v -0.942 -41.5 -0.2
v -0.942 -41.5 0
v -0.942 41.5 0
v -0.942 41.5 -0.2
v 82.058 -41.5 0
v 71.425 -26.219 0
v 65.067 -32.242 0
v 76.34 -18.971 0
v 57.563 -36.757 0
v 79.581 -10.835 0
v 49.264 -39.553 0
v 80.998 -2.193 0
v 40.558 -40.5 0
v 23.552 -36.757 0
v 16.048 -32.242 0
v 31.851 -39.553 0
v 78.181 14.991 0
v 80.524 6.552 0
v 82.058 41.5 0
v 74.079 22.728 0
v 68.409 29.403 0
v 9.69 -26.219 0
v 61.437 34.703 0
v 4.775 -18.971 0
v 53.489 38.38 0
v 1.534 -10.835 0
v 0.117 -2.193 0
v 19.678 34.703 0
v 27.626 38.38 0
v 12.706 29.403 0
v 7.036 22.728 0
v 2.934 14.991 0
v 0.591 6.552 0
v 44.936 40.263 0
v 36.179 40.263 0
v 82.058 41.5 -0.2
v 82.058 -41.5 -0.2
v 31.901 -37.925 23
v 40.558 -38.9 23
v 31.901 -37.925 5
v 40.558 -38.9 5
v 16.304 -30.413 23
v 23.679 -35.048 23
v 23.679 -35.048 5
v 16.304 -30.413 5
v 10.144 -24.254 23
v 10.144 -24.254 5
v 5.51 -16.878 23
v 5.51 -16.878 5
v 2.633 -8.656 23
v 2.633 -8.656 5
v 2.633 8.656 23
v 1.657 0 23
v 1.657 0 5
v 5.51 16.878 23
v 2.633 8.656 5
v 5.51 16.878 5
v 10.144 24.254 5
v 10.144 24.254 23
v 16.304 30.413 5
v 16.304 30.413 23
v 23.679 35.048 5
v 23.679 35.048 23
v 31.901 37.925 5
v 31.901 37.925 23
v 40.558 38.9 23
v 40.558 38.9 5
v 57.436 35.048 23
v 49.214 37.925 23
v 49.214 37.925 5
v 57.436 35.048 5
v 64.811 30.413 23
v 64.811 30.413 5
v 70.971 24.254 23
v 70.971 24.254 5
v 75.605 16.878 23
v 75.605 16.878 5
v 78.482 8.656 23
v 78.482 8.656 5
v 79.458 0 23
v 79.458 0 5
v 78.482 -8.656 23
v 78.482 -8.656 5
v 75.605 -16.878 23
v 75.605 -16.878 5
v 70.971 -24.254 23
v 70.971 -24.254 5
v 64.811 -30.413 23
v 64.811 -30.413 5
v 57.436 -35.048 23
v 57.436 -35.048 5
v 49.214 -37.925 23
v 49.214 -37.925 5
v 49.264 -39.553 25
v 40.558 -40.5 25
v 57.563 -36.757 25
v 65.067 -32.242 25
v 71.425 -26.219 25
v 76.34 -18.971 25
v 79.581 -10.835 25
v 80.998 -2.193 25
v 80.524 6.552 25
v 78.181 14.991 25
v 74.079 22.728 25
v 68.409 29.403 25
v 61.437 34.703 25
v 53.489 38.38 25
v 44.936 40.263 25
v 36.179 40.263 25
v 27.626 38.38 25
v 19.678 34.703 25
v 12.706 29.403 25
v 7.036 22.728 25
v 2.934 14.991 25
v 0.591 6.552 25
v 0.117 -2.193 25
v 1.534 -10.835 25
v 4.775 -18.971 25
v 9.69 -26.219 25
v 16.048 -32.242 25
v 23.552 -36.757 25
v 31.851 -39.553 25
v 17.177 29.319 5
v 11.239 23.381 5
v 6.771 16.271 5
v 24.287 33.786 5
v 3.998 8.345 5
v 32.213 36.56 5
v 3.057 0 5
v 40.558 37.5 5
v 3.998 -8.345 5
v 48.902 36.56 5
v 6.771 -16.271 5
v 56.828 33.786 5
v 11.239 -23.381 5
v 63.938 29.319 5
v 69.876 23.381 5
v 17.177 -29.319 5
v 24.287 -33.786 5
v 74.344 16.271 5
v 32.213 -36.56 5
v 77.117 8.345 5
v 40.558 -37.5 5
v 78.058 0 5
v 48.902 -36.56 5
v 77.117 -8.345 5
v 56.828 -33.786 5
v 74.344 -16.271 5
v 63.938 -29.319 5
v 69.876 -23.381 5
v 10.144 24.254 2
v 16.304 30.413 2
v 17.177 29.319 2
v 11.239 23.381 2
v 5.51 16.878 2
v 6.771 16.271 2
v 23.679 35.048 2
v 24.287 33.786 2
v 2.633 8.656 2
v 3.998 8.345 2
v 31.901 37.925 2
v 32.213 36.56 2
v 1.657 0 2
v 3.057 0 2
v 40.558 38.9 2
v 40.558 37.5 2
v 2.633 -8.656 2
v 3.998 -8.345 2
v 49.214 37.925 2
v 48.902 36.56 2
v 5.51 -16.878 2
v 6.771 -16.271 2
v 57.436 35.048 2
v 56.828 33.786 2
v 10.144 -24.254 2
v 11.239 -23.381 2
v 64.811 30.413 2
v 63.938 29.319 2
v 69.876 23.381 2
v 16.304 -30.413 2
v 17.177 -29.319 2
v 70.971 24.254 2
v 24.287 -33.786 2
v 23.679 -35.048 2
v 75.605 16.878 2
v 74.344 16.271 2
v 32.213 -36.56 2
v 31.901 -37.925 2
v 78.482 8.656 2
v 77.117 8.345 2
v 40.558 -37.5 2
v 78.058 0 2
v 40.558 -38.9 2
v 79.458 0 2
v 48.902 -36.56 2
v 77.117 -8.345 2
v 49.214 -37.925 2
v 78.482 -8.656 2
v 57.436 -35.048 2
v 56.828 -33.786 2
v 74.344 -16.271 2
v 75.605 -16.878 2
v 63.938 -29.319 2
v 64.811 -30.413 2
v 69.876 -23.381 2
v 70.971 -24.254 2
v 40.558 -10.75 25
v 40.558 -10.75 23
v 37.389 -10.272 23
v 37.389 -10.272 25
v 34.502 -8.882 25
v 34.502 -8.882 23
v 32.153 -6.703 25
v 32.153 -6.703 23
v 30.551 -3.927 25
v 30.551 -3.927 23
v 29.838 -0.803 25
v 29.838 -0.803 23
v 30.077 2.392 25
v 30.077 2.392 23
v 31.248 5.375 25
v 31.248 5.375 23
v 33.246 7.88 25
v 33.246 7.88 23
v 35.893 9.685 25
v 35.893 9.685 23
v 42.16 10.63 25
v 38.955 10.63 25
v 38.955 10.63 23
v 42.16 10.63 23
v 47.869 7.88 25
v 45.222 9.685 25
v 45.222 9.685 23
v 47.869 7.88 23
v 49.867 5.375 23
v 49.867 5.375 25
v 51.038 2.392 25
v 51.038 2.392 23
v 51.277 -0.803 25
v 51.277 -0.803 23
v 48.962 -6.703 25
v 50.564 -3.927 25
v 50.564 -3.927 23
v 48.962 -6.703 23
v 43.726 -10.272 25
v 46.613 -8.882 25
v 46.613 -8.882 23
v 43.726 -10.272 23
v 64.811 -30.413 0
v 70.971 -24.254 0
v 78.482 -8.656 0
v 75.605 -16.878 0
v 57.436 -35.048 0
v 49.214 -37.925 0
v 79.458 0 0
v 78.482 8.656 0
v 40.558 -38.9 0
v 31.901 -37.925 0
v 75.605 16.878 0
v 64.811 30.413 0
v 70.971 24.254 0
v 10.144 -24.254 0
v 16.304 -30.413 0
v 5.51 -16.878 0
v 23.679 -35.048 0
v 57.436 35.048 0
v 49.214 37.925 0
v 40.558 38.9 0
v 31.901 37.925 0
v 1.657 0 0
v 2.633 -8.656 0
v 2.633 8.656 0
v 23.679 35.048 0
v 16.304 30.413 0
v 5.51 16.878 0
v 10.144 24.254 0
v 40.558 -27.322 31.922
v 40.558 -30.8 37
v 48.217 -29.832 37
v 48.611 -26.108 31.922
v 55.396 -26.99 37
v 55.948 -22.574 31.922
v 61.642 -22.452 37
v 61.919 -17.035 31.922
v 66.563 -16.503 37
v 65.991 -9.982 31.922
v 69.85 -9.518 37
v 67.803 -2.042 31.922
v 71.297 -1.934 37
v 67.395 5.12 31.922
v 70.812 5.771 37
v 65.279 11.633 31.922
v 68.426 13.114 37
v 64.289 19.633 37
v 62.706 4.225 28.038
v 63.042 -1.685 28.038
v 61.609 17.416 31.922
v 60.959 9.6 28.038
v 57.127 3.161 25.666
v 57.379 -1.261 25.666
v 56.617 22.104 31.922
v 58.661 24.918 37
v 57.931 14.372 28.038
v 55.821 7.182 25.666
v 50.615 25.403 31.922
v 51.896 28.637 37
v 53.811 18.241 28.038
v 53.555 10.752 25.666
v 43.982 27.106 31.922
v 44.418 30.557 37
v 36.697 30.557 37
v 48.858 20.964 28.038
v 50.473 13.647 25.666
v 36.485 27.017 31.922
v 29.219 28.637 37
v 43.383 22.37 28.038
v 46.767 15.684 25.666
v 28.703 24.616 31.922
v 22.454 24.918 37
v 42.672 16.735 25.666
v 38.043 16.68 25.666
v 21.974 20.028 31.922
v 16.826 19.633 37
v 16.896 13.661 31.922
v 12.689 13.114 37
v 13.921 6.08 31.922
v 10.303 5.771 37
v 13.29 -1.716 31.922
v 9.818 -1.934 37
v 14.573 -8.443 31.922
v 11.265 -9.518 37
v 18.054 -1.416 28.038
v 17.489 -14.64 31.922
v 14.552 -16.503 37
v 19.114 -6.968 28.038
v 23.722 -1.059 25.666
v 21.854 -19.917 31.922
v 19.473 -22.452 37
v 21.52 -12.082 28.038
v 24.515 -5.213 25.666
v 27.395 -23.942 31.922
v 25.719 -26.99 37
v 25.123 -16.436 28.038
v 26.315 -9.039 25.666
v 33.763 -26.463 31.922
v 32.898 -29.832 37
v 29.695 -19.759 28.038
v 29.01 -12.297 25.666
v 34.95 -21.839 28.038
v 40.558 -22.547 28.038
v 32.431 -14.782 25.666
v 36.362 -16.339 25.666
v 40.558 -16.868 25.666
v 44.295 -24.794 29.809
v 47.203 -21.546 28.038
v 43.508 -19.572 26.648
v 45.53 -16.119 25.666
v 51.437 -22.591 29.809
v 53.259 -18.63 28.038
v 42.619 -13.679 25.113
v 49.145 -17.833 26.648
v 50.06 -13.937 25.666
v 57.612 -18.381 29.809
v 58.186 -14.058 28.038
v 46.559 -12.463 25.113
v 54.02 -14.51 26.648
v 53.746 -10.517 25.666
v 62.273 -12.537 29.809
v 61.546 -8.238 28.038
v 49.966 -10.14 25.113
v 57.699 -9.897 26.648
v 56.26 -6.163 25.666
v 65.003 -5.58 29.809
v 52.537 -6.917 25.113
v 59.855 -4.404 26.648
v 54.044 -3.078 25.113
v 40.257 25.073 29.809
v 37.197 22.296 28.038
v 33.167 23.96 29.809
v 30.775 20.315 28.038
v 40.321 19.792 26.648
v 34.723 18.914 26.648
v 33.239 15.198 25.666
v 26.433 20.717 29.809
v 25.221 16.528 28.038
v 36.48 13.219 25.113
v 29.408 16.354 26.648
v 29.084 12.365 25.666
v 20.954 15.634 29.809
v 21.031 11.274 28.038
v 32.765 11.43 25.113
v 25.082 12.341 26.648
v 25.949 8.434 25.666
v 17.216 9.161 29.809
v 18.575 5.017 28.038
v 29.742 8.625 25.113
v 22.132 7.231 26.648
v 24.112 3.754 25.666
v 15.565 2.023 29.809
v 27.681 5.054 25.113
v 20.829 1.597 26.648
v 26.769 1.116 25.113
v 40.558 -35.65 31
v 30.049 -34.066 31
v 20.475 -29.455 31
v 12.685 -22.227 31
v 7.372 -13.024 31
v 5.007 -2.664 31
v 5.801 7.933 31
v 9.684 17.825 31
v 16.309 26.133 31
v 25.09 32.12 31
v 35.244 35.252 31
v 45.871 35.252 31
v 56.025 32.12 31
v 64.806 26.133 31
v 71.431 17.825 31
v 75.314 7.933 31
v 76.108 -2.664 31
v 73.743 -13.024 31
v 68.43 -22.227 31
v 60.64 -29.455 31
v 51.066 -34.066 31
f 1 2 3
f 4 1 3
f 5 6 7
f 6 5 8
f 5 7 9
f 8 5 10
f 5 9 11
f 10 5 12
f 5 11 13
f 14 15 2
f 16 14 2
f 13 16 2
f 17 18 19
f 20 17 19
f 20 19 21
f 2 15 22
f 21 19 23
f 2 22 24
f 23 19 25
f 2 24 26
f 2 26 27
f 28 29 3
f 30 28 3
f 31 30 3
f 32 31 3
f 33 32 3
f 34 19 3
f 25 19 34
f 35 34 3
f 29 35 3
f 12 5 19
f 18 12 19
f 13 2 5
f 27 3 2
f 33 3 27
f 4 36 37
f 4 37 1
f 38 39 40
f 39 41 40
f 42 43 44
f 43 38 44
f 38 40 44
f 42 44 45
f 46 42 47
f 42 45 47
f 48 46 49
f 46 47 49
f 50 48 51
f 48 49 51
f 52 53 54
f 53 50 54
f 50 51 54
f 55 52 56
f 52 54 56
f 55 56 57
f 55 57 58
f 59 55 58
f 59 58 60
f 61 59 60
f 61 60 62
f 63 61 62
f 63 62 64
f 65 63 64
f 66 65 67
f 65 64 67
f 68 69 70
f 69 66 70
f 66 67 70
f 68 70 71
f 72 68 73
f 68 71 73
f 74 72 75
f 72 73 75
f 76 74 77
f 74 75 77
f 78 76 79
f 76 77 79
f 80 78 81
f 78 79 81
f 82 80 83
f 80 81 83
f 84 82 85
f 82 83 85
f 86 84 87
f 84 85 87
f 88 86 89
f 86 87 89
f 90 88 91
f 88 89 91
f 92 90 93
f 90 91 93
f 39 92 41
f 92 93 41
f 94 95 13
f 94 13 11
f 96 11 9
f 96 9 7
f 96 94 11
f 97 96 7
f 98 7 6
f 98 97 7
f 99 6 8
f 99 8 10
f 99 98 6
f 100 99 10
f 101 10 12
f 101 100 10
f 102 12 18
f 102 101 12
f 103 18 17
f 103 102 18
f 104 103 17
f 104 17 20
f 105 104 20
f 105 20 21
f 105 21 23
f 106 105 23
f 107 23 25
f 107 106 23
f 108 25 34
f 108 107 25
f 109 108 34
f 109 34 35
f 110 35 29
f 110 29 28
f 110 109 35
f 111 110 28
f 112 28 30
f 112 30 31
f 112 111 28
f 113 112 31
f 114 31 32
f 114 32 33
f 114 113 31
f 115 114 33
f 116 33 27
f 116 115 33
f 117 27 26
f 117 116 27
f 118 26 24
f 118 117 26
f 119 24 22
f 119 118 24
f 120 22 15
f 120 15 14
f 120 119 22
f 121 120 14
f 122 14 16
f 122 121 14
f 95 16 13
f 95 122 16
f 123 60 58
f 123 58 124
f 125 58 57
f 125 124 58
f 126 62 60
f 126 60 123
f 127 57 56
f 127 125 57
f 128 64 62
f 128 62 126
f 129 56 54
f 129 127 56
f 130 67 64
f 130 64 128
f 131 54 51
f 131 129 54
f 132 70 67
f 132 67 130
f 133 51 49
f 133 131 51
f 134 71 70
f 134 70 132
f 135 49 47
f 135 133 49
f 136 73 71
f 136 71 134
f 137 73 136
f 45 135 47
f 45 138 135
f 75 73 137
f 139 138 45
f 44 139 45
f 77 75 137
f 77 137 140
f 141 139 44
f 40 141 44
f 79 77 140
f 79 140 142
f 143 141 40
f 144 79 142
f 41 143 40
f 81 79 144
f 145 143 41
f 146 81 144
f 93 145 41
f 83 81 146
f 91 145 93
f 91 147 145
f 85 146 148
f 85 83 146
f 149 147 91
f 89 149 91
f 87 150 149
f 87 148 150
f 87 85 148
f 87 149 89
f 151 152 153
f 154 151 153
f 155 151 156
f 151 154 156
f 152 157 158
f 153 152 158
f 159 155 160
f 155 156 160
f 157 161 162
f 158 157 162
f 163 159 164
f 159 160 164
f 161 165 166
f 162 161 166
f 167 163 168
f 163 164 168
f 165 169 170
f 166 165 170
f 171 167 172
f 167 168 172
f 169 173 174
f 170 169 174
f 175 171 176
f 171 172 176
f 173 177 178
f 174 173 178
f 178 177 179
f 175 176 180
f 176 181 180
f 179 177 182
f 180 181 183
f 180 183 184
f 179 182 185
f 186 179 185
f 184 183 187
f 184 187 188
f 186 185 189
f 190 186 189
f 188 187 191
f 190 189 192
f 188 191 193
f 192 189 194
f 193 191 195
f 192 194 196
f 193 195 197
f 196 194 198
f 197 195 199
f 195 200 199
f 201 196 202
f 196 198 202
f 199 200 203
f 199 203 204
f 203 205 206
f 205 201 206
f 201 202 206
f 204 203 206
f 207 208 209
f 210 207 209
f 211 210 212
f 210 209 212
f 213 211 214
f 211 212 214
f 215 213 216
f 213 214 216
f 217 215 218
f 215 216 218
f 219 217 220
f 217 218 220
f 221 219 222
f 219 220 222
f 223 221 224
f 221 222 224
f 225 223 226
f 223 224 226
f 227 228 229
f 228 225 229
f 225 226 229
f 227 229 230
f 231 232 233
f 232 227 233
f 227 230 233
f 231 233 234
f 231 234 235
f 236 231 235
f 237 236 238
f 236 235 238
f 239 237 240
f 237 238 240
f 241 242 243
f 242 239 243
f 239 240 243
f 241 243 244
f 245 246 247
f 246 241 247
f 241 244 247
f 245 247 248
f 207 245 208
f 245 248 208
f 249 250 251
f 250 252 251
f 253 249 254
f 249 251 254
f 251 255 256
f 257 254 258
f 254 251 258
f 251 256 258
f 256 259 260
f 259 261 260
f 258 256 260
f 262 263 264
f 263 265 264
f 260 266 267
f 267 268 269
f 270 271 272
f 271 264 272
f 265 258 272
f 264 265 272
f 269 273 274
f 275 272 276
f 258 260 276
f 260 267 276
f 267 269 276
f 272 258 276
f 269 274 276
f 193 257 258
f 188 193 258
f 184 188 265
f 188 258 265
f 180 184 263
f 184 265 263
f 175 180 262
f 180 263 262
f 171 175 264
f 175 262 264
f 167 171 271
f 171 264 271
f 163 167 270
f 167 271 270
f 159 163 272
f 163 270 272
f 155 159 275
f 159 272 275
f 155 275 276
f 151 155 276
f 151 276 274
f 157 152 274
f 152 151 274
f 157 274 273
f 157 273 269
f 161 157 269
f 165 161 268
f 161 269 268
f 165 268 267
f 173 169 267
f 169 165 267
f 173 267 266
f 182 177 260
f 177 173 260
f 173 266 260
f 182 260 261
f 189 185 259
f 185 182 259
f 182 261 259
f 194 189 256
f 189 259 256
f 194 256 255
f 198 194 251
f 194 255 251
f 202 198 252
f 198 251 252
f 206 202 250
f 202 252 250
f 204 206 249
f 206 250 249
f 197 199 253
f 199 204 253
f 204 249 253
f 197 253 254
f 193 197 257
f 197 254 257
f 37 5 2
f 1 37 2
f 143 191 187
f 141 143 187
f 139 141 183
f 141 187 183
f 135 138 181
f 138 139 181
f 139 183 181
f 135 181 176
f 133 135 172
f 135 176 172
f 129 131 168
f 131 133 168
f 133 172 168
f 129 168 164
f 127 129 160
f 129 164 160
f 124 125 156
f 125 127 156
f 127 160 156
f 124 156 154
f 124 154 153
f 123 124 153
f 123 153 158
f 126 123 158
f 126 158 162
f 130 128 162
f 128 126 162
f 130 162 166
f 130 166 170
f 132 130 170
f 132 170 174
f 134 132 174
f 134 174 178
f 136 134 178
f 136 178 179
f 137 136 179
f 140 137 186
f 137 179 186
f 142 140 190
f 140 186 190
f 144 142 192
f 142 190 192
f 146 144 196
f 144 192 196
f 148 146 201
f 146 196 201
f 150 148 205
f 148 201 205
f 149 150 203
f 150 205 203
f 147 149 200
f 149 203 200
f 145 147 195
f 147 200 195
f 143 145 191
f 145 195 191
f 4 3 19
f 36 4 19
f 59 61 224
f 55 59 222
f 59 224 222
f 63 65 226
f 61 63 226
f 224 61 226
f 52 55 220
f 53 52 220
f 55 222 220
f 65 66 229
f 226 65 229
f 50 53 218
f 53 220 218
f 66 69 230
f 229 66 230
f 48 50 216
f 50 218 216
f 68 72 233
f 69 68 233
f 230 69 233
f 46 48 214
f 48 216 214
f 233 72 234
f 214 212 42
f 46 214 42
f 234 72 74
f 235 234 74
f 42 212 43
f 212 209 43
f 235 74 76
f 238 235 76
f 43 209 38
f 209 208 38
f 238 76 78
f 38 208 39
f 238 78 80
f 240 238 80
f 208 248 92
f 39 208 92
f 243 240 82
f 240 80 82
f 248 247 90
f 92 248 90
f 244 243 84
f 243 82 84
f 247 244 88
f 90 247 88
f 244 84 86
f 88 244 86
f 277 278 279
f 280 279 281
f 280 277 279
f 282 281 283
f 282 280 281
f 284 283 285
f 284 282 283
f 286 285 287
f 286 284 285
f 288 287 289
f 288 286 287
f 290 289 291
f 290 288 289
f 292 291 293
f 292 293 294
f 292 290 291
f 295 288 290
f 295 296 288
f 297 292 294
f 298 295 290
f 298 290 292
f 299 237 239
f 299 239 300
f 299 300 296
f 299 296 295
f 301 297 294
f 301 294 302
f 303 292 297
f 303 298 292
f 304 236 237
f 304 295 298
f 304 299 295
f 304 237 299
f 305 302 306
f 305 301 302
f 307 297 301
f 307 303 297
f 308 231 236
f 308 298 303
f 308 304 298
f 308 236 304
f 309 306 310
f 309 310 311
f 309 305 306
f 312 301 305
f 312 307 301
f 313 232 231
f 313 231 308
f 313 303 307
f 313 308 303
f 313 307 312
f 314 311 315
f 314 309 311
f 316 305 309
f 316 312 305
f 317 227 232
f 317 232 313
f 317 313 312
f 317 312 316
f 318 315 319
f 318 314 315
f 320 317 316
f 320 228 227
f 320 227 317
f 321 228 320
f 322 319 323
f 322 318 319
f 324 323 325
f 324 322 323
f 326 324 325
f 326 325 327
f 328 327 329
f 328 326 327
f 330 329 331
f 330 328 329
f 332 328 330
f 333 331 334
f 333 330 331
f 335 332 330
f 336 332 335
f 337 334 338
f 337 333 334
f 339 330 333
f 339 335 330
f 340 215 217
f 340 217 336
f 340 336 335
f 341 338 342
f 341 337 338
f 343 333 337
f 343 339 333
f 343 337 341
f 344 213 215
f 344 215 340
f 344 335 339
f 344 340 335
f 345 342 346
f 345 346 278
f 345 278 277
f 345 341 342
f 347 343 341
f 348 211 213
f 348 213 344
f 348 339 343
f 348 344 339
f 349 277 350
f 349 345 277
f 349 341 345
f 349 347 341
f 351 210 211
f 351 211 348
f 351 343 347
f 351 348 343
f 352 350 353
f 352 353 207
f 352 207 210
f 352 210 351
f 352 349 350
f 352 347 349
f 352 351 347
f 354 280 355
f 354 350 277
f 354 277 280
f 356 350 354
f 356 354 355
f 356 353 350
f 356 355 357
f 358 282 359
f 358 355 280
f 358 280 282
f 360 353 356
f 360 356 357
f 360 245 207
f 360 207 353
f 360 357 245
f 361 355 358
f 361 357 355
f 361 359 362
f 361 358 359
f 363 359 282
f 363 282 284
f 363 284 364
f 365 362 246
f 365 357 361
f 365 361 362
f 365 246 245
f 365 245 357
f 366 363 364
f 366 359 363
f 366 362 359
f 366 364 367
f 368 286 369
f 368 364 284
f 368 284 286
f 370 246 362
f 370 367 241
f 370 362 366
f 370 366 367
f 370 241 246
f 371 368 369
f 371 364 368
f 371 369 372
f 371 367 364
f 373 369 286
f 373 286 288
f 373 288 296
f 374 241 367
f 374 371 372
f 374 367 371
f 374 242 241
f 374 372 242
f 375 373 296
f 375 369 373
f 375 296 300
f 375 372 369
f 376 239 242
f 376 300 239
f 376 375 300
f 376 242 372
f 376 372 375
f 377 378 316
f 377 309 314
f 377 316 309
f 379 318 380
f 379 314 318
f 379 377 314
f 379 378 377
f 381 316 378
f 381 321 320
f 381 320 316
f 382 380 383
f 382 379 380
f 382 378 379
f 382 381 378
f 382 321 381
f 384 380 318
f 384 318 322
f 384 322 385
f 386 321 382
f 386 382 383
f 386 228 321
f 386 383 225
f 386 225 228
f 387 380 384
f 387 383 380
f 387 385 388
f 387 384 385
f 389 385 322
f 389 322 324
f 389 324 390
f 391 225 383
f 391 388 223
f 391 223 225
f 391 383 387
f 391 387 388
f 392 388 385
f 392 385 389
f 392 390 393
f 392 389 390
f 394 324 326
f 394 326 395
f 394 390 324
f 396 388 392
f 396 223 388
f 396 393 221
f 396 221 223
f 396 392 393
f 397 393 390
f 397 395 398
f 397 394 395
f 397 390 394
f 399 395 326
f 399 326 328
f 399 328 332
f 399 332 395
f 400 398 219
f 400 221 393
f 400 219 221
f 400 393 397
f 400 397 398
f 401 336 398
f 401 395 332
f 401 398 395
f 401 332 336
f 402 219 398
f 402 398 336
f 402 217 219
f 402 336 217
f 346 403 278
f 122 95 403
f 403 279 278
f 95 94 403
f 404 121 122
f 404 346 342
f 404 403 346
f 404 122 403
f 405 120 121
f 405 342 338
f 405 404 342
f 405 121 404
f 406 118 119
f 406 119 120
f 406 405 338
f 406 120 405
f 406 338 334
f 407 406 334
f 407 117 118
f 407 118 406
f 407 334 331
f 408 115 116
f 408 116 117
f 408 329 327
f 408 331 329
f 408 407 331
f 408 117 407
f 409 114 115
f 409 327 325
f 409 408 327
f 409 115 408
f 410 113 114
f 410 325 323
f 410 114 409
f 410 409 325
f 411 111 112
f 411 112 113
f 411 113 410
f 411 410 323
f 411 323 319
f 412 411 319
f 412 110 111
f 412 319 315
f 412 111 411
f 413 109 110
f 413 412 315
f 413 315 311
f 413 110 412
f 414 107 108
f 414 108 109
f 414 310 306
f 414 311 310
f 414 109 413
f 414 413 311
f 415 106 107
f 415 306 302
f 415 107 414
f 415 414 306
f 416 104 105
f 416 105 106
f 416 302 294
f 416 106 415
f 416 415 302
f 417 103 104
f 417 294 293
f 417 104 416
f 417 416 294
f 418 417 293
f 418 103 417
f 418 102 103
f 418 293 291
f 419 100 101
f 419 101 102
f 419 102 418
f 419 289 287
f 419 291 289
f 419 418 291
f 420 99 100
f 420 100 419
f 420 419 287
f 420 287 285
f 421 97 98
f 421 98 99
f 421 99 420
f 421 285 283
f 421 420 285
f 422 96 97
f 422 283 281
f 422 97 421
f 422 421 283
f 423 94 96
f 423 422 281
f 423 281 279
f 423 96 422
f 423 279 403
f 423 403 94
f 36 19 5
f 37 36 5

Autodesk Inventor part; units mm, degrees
ref_plane "XZ Plane" through (0, 0, 0) normal (0, 1, 0) x (-1, 0, 0)
ref_plane "XY Plane" through (0, 0, 0) normal (0, 0, 1) x (1, 0, 0)
sketch "草圖2" plane through (11.879, 11.879, 0) normal (0, 0, -1) x (-1, 0, 0)
  circle A0 centre (-28.6785, 28.6785) radius 40.5575 projected
  point P0 (11.879, -11.879)
ref_plane "工作平面1" through (40.5575, 40.5575, 0) normal (1, 0, 0) x (0, 1, 0)
sketch "草圖3" plane through (40.5575, 40.5575, 0) normal (1, 0, 0) x (0, 1, 0)
  line L0 (-81.0575, 0) -> (-81.0575, 25)
  line L1 (-51.3075, 25) -> (-51.3075, 23)
  line L2 (-51.3075, 23) -> (-79.4575, 23)
  line L3 (-79.4575, 23) -> (-79.4575, 5)
  line L4 (-79.4575, 5) -> (-78.0575, 5)
  line L5 (-78.0575, 5) -> (-78.0575, 2)
  line L6 (-78.0575, 2) -> (-79.4575, 2)
  line L7 (-79.4575, 2) -> (-79.4575, 0)
  line L8 (-79.4575, 0) -> (-81.0575, 0)
  line L9 (-40.5575, 26.2986) -> (-40.5575, 44.6693) construction
  arc A0 (-71.3575, 37) -> (-51.3075, 25) centre (-52.0637, 46.4867) ccw
  line L10 (-81.0575, 25) -> (-71.3575, 37)
  point P0 (-40.5575, 0)
  dimension "d0" = 21.5
  dimension "d1" = 1.6
  dimension "d2" = 81
  dimension "d3" = 25
  dimension "d4" = 2
  dimension "d5" = 3
  dimension "d6" = 3
  dimension "d7" = 2
  dimension "d8" = 12
  dimension "d9" = 9.7
  dimension "d10" = 23
  dimension "d11" = 21.5
revolve "迴轉1" add sketch "草圖3" angle 360 about axis through (40.5575, 0, 26.2986) along (0, 0, 1)
sketch "草圖4" plane through (40.5575, 0, 0) normal (0, 0, -1) x (-1, 0, 0)
  line L0 (-40.5, -40.5) -> (40.5, -40.5) construction
  line L1 (40.5, -40.5) -> (40.5, 40.5) construction
  line L2 (40.5, 40.5) -> (-40.5, 40.5) construction
  line L3 (-40.5, 40.5) -> (-40.5, -40.5) construction
  circle A0 centre (0, 0) radius 40.5 construction
  line L4 (-41.5, -41.5) -> (41.5, -41.5)
  line L5 (41.5, -41.5) -> (41.5, 41.5)
  line L6 (41.5, 41.5) -> (-41.5, 41.5)
  line L7 (-41.5, 41.5) -> (-41.5, -41.5)
  point P0 (40.5575, 0)
  dimension "d15" = 1
extrude "擠出1" add sketch "草圖4" along normal blind 0.2
properties part number "上" material "SS41"
